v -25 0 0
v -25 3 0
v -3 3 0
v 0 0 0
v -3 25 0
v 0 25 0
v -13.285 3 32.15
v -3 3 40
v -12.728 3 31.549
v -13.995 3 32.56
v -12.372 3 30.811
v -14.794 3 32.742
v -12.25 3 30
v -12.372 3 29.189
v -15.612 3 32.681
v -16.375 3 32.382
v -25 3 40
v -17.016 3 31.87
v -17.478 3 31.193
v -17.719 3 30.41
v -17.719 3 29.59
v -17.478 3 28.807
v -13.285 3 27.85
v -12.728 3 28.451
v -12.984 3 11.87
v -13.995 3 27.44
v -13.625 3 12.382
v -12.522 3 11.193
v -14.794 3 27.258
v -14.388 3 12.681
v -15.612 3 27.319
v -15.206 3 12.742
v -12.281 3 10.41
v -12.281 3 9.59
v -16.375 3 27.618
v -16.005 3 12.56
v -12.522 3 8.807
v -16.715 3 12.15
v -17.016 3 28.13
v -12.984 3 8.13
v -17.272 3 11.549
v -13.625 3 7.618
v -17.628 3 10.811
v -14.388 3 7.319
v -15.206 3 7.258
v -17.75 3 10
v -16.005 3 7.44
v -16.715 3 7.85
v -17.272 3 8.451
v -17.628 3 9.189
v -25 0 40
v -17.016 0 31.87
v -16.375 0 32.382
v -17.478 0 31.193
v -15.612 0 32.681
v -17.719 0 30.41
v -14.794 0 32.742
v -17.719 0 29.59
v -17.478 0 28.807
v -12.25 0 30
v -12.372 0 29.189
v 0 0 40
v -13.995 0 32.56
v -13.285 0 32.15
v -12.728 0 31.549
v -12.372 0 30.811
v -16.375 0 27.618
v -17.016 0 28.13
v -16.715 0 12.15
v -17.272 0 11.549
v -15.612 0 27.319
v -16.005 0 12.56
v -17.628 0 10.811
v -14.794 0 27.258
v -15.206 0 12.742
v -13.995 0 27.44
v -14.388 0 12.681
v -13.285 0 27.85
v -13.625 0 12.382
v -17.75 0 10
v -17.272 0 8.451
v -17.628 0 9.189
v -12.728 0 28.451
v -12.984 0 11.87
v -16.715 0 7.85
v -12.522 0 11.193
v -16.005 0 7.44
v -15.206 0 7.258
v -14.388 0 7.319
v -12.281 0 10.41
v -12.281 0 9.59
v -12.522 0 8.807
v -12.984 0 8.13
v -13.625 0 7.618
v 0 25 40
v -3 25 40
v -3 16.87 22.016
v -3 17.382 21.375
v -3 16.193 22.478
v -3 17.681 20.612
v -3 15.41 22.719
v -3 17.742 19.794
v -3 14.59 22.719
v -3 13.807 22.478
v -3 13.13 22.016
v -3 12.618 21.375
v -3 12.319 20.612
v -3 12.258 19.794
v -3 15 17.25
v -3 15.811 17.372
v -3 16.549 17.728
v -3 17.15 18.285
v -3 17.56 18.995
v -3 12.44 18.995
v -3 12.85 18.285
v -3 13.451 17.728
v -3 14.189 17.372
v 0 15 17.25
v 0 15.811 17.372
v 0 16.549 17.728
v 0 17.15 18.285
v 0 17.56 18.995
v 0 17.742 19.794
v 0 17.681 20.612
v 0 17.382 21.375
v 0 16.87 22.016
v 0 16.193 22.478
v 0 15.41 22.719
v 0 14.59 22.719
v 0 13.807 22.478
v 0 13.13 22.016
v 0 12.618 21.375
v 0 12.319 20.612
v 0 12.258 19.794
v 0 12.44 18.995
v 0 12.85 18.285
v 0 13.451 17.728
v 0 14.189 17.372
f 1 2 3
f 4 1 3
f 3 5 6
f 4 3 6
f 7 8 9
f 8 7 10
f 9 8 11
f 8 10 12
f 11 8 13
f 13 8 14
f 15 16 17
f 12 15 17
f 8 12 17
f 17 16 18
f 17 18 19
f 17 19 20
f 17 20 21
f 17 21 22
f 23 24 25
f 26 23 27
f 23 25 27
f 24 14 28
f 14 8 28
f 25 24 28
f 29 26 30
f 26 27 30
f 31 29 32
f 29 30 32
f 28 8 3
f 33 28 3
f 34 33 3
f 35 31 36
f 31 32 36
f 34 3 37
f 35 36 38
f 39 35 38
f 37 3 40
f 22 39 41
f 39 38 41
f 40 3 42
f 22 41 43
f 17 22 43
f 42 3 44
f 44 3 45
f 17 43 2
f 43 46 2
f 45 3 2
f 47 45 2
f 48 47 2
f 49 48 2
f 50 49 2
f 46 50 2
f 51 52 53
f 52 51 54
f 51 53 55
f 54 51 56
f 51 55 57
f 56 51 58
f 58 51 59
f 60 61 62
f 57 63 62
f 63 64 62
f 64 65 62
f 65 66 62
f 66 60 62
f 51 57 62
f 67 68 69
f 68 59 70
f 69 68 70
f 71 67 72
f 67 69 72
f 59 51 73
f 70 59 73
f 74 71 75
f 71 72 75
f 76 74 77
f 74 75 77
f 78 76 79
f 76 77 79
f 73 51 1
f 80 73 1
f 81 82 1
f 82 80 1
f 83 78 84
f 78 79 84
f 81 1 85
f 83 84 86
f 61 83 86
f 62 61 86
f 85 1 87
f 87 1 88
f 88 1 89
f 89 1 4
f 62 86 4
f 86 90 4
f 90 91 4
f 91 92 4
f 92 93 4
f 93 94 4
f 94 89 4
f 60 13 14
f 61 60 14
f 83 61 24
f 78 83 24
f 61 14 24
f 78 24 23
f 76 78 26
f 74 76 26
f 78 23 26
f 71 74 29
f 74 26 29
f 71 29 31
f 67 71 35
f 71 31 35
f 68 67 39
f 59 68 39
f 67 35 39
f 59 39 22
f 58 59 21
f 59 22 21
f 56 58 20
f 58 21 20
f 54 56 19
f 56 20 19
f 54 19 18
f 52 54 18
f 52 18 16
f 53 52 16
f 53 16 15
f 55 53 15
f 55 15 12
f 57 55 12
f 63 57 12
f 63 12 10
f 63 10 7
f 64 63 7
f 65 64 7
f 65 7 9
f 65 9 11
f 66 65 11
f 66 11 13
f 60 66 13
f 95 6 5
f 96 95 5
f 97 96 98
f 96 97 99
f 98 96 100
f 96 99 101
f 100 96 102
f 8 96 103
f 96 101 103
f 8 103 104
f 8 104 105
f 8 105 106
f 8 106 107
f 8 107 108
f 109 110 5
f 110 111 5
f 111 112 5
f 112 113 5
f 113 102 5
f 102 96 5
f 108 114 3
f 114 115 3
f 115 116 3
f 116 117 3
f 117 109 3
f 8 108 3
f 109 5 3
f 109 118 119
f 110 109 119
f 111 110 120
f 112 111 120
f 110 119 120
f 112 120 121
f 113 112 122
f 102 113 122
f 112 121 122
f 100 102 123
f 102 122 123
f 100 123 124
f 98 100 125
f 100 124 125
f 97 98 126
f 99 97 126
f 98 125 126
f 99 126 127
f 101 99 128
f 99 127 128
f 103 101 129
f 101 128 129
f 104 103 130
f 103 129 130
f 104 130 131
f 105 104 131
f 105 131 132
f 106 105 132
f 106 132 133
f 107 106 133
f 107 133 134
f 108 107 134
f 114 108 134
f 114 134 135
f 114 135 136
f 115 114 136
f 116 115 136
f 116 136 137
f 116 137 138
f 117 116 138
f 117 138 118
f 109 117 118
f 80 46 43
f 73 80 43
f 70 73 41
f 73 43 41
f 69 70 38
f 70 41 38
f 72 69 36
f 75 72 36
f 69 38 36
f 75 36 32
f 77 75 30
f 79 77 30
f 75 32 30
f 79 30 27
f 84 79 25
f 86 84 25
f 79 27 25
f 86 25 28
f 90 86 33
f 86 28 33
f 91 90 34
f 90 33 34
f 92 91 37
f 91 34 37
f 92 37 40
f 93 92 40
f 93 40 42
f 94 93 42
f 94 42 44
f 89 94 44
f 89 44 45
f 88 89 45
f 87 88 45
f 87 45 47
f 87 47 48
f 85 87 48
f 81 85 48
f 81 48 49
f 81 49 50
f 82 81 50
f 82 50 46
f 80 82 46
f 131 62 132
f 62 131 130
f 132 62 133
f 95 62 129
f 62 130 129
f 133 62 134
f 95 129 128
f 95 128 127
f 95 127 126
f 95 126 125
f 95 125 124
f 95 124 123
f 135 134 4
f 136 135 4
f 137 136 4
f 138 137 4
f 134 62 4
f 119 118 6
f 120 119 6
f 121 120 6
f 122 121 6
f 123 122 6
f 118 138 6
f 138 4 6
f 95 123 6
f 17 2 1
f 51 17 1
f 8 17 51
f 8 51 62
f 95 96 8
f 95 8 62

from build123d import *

# Parameters (mm, degrees)
BOSS_EXTRUDE1_DEPTH        = 40
SKETCH2_R                  = 2.75
CUT_EXTRUDE1_DEPTH         = 53.048054719
F_5_0_5_5_DIAMETER_HOLE1_D = 5.5


with BuildPart() as part:
    # Sketch1 → Boss-Extrude1 (new body)
    with BuildSketch(Plane.XY):
        Polygon((0, 0), (0, 25), (-3, 25), (-3, 3), (-25, 3), (-25, 0), align=None)
    extrude(amount=BOSS_EXTRUDE1_DEPTH)

    # Sketch2 → Cut-Extrude1 (cut, through all)
    with BuildSketch(Plane(origin=(0, 3, 0), x_dir=(1, 0, 0), z_dir=(0, 1, 0))):
        with Locations(Location((-15, -10, 0), (0, 0, 180))):
            Circle(SKETCH2_R)
        with Locations((-15, -30)):
            Circle(SKETCH2_R)
    extrude(amount=-CUT_EXTRUDE1_DEPTH, mode=Mode.SUBTRACT)

    # Ø5.0 (5.5) Diameter Hole1 (through all)
    with Locations(Plane.ZY.offset(3)):
        with Locations((20, 15)):
            Hole(F_5_0_5_5_DIAMETER_HOLE1_D / 2)


solid = part.part
